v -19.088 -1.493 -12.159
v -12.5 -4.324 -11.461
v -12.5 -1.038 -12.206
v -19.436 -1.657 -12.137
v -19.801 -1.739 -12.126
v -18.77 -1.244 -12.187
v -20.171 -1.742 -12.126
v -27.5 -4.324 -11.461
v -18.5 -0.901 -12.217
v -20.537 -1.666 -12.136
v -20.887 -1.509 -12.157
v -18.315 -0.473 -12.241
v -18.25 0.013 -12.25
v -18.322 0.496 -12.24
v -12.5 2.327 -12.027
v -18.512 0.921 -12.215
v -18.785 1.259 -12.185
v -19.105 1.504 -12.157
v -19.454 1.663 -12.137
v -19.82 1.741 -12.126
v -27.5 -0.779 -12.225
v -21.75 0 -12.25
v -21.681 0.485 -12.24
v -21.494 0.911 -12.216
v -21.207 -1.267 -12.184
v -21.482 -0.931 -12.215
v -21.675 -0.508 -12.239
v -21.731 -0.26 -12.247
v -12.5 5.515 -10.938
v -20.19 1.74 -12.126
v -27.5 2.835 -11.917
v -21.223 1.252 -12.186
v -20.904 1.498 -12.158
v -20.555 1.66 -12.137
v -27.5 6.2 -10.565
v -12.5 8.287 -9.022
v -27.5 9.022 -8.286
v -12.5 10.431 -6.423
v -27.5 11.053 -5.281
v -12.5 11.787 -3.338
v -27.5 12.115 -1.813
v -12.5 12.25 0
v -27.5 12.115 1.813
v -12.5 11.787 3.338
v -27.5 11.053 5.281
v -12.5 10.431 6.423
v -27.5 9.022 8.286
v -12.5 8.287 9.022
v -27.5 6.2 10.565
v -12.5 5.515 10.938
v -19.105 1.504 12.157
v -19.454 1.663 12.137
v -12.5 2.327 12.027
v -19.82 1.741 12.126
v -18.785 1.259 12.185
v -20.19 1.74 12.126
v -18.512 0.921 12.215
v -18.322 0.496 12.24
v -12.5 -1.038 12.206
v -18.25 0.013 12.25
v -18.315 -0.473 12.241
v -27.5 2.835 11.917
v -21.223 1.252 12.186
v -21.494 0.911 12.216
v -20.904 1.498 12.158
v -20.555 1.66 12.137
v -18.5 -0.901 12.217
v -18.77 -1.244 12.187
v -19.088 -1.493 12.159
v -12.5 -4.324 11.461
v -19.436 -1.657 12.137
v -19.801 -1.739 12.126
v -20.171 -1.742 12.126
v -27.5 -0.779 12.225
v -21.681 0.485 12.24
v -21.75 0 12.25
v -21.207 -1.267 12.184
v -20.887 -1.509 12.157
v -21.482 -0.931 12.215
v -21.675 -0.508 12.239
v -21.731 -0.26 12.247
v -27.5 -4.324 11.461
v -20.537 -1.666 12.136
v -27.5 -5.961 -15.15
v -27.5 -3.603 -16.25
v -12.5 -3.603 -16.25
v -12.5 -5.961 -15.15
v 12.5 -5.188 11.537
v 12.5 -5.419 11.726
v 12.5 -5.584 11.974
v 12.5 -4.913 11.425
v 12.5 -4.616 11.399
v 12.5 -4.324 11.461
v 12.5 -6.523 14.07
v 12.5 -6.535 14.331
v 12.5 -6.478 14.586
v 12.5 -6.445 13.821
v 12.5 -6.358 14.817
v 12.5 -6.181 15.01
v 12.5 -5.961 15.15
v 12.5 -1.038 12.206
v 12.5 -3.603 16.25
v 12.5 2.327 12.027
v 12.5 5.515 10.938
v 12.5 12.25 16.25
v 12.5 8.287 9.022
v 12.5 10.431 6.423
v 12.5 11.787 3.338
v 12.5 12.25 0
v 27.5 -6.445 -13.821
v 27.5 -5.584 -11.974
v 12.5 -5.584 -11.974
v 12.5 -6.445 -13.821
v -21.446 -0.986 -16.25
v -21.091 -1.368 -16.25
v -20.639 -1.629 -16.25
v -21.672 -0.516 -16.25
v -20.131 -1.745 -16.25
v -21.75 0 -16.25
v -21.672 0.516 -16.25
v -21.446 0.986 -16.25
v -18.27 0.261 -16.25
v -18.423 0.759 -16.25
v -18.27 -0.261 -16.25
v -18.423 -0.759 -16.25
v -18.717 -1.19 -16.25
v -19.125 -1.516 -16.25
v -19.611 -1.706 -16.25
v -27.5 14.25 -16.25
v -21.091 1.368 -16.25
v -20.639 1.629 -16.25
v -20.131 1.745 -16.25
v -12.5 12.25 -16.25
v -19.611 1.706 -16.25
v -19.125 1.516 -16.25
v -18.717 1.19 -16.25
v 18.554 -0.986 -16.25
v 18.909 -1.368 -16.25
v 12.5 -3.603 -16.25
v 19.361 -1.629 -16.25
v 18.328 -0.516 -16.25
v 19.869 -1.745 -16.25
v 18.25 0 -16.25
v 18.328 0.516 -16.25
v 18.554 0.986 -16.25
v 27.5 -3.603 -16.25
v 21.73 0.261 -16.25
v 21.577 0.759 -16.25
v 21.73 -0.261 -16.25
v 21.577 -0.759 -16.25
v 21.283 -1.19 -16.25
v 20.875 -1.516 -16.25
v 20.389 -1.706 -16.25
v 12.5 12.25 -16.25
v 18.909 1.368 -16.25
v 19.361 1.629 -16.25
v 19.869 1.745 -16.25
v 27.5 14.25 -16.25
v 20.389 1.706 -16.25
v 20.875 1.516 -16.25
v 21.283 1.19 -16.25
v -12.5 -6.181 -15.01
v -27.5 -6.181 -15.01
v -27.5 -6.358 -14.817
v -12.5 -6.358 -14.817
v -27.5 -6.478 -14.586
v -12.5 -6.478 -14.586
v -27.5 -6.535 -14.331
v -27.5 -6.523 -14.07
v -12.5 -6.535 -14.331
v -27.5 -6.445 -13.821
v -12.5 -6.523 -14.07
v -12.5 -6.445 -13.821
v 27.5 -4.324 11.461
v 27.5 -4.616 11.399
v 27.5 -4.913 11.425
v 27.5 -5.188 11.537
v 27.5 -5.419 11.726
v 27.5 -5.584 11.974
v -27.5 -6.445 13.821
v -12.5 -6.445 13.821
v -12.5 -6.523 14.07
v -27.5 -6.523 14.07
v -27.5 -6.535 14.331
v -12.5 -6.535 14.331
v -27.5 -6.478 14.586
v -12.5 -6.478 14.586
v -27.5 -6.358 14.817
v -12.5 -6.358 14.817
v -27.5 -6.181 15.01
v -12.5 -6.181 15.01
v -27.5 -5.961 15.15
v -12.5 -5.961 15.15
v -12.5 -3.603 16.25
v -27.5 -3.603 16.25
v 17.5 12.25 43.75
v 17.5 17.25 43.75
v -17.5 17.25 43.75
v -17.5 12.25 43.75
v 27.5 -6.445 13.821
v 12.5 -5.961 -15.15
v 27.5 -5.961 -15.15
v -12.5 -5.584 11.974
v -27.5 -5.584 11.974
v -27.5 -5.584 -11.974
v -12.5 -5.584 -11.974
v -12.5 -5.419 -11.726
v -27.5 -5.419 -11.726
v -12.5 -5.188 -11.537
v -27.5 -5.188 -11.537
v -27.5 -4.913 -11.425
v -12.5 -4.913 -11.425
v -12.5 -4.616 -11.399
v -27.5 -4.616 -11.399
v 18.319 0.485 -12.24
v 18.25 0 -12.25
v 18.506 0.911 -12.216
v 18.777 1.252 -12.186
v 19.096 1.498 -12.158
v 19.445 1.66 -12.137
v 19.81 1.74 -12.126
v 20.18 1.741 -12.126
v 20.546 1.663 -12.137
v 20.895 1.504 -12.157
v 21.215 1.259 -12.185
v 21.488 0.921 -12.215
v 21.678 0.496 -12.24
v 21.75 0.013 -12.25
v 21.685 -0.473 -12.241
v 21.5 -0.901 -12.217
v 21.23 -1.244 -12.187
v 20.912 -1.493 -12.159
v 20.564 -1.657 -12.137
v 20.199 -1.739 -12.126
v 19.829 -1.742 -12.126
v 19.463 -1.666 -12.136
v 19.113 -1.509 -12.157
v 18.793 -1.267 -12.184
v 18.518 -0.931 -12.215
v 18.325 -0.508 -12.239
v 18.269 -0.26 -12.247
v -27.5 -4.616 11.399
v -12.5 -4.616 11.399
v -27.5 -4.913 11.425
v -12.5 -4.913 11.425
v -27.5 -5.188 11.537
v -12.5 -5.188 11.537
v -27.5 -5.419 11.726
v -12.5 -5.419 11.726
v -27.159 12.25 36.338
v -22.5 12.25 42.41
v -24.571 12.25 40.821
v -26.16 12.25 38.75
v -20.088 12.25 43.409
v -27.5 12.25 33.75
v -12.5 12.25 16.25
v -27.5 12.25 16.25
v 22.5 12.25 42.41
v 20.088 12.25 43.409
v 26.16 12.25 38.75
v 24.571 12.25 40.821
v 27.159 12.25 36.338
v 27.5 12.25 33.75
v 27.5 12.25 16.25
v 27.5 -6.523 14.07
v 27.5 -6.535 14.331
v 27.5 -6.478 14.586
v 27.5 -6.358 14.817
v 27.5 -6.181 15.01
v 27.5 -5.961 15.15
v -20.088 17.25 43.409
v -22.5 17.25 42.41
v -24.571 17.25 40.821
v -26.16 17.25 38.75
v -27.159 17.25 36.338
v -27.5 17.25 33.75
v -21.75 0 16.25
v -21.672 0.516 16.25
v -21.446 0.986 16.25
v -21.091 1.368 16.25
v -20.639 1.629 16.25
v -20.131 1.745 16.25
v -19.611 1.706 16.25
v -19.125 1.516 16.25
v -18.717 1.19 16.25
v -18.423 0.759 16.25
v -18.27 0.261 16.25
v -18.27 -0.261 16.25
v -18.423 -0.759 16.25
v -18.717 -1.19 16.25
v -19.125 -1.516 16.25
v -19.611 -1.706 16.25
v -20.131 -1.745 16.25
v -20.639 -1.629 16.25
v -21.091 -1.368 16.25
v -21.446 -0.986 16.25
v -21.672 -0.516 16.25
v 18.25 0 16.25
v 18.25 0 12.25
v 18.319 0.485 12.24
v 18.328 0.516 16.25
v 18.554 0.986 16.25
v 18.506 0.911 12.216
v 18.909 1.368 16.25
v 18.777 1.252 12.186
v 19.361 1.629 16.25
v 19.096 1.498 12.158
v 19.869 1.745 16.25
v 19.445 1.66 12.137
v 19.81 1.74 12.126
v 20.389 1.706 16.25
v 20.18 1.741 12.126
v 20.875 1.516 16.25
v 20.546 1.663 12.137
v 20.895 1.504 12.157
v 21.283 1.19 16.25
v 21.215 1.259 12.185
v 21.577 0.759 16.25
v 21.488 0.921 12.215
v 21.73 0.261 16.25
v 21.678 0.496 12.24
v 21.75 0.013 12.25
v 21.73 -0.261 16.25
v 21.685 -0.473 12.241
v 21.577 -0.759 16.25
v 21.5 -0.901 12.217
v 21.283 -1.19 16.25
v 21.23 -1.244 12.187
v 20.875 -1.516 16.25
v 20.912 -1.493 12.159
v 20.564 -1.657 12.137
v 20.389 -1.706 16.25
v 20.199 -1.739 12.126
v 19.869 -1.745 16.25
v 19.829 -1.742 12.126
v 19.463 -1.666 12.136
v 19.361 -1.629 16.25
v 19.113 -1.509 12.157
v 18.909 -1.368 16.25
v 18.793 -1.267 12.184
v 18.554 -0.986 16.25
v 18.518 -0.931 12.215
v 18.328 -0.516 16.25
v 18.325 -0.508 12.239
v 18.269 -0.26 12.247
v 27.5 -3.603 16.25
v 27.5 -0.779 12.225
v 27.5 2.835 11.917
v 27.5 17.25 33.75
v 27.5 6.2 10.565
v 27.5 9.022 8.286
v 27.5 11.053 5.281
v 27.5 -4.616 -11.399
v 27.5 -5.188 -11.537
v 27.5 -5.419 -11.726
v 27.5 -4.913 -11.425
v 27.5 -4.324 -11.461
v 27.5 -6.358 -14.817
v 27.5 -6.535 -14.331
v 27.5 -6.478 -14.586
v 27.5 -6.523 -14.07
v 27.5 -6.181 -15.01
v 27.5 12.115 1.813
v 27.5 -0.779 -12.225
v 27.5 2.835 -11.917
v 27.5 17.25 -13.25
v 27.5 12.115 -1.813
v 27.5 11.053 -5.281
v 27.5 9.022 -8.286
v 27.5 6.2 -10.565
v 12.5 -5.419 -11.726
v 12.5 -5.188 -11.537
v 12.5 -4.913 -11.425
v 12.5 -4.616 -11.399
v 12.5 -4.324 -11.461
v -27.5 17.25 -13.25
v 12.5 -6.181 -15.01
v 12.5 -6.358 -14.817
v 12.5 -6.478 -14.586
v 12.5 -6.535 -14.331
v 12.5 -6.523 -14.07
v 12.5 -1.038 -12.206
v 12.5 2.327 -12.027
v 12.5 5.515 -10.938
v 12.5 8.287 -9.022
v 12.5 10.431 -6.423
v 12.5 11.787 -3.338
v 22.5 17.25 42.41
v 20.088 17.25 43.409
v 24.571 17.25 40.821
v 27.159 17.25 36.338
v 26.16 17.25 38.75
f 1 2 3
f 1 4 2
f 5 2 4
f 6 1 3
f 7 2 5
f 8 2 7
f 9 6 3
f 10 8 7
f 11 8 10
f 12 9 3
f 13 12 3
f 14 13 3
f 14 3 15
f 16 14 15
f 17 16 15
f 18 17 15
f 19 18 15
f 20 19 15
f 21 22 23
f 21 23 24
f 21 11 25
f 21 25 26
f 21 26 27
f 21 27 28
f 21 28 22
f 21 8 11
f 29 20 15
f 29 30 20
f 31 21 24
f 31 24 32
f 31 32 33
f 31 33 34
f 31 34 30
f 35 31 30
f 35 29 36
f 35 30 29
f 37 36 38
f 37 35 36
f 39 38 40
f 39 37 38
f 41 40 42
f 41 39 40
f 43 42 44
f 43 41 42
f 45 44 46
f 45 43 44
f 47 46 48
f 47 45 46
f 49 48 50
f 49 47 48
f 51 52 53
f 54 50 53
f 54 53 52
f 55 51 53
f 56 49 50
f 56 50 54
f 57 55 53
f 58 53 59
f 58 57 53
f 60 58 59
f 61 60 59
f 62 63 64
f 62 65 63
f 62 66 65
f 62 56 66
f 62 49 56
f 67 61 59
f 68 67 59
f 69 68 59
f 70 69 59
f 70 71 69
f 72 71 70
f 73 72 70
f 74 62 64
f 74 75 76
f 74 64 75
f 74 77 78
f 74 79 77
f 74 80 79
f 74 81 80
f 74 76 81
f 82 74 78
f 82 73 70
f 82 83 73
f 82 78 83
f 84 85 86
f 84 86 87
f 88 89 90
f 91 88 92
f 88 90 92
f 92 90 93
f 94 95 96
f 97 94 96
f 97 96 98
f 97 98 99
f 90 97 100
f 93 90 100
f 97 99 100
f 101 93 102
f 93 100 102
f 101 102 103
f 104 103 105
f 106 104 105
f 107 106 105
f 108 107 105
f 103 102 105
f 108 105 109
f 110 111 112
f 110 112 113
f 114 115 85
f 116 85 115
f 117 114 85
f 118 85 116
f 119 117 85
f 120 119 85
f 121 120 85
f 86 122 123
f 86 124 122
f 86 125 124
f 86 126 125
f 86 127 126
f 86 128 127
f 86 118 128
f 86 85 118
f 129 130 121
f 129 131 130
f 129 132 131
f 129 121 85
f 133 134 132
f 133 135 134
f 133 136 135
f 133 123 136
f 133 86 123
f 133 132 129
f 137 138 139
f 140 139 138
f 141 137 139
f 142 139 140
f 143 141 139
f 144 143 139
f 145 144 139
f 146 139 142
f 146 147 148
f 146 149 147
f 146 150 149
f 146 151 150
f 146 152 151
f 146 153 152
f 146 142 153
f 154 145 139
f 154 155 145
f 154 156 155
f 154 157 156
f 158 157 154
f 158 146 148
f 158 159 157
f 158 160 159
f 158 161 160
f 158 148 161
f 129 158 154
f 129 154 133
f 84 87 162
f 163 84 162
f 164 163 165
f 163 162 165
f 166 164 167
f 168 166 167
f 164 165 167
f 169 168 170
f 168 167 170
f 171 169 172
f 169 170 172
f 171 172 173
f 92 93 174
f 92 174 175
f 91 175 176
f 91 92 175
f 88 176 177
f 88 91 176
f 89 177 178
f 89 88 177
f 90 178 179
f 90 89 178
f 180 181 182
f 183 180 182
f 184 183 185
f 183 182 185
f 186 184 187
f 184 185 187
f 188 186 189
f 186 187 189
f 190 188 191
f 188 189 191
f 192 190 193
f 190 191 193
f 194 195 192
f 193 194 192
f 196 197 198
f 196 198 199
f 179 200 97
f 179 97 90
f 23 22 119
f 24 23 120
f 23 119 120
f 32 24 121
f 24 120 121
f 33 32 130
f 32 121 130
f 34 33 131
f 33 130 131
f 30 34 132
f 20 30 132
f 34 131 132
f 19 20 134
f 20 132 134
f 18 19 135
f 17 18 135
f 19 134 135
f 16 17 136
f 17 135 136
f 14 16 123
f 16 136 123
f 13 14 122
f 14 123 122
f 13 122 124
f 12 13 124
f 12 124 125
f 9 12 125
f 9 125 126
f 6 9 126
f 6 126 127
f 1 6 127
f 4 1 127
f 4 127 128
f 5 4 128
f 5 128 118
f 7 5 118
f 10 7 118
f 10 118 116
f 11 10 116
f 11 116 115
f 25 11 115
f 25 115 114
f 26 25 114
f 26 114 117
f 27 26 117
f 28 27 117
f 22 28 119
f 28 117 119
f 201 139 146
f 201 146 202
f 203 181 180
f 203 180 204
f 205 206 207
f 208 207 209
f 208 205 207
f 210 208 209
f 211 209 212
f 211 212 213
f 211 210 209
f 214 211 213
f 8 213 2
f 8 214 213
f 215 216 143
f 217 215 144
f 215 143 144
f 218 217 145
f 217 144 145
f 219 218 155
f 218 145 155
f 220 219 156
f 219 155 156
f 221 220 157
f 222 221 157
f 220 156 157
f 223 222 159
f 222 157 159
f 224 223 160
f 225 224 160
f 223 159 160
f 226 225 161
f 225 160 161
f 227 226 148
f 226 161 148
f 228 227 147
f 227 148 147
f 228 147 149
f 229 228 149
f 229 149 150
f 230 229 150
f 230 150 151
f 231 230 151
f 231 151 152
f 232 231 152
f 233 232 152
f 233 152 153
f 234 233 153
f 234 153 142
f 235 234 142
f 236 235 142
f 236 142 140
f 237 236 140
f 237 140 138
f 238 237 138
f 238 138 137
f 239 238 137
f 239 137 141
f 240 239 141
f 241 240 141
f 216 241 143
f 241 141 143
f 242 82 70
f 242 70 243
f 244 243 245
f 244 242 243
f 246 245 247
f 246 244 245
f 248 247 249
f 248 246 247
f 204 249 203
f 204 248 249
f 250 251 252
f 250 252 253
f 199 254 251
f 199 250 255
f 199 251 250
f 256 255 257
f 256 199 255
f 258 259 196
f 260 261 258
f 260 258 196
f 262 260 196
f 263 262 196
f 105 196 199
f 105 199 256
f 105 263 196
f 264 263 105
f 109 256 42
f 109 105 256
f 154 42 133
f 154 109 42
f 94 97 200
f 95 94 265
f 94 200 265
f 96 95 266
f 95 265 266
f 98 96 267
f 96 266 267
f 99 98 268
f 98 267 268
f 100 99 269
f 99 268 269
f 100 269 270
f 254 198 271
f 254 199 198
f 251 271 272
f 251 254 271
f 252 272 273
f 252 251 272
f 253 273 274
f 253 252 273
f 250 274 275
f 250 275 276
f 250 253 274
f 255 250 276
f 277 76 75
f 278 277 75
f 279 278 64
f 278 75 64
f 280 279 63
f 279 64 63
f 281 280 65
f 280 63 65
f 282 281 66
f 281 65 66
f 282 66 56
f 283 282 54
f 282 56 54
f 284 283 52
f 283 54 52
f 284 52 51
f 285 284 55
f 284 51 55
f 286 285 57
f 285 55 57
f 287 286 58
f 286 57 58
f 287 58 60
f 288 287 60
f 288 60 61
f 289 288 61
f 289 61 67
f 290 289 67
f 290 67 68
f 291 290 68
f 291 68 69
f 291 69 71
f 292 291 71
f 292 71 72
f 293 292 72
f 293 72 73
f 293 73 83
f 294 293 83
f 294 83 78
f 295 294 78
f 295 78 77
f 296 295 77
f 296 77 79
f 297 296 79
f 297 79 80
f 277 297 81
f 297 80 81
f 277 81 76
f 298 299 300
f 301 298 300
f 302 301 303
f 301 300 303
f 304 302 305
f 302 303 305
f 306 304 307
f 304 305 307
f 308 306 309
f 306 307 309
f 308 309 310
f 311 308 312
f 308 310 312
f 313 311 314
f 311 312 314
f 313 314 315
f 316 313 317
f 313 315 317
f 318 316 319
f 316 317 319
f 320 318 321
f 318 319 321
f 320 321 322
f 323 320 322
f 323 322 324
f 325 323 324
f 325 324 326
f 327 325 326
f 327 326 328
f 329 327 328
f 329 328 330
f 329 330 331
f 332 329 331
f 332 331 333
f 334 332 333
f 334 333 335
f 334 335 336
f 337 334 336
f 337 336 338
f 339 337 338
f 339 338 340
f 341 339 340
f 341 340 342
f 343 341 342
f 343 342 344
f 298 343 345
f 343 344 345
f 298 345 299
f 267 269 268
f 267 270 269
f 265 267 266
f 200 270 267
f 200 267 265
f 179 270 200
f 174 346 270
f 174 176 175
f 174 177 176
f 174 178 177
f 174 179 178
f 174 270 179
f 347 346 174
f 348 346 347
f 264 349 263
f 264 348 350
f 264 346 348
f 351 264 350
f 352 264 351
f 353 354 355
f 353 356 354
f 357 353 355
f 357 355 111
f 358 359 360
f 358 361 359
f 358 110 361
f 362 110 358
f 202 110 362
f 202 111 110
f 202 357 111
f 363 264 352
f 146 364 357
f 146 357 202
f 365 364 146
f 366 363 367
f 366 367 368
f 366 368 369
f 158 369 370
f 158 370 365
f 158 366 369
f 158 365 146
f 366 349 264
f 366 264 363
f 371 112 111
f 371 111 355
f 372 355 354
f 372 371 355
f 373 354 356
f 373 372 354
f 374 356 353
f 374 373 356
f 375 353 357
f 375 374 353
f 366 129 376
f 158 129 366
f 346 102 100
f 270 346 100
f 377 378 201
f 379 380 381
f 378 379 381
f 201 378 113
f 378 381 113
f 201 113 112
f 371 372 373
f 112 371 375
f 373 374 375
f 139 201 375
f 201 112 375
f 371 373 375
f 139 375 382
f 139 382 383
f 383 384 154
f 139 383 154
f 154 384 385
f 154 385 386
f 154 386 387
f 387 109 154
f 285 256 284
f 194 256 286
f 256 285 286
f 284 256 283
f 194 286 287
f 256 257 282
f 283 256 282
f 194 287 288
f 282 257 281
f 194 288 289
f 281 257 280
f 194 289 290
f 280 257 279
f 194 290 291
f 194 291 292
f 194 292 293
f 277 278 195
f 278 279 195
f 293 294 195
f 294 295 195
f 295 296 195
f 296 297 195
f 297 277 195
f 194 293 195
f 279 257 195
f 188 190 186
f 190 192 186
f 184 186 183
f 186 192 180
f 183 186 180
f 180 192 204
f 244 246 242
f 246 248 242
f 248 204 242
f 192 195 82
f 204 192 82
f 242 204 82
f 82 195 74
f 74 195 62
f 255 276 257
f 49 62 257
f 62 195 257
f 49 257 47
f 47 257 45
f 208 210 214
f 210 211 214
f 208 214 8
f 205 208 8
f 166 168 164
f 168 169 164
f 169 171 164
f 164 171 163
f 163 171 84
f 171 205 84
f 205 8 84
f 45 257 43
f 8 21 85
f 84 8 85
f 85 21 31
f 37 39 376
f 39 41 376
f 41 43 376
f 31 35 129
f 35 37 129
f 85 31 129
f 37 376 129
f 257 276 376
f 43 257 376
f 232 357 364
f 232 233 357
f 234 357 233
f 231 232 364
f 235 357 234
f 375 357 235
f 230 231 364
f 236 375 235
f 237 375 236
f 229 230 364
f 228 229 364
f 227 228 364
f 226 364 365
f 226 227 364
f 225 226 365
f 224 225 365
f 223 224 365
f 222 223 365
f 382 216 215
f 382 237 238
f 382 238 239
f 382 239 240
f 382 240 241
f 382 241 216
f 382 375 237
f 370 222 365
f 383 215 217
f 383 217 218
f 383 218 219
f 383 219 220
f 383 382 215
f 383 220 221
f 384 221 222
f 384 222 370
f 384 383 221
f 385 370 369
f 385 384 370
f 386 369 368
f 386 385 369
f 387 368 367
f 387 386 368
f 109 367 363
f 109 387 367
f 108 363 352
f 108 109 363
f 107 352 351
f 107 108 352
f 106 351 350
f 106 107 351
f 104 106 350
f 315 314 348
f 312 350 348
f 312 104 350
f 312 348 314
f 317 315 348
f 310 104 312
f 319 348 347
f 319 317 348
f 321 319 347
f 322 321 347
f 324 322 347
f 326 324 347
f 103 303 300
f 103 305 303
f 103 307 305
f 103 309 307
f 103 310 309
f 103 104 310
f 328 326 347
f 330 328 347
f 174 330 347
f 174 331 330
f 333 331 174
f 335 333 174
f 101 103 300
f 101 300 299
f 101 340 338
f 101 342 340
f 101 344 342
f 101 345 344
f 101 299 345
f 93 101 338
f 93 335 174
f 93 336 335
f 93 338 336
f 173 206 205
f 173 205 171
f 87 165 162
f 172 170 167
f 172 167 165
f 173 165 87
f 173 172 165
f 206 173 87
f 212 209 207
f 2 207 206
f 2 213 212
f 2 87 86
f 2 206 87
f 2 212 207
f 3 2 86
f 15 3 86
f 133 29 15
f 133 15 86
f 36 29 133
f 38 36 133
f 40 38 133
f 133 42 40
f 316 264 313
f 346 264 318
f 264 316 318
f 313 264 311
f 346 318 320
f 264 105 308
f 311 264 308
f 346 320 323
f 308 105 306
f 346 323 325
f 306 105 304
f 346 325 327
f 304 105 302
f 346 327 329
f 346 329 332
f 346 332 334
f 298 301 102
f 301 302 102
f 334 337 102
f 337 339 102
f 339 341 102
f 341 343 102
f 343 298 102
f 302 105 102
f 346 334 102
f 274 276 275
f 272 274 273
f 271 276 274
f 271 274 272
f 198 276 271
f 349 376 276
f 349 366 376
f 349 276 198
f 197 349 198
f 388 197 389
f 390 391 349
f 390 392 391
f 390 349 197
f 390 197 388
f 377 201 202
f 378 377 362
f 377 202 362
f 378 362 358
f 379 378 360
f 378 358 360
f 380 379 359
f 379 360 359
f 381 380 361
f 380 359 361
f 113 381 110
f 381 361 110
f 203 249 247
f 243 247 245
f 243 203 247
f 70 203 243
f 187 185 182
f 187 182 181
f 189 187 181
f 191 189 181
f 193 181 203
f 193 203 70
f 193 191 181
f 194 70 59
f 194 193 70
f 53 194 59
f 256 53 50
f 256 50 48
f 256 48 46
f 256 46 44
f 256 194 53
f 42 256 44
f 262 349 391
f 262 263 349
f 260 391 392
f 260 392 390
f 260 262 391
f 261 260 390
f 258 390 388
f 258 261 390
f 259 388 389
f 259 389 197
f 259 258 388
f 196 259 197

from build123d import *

# Parameters (mm, degrees)
SKETCH_1_R               = 12.25
EXTRUDE_1_DEPTH          = 27.5
CUT_EXTRUDE_2_DEPTH      = 1
CUT_EXTRUDE_2_DEPTH_BACK = 56
EXTRUDE_2_DEPTH          = 55
FILLET_1_R               = 1
SKETCH_5_R               = 1.75
CUT_EXTRUDE_3_DEPTH      = 61
SKETCH_2_W               = 25
SKETCH_2_H               = 30
CUT_EXTRUDE_1_DEPTH      = 33.5000001
FILLET_2_R               = 10
CHAMFER_1_SIZE           = 3


with BuildPart() as part:
    # ｽｹｯﾁ1 → ﾎﾞｽ - 押し出し1 (new body, symmetric)
    with BuildSketch(Plane(origin=(0, 0, 0), x_dir=(0, 0, -1), z_dir=(1, 0, 0))):
        with BuildLine():
            Line((16.25, 0), (16.25, 17.25))
            Line((16.25, 17.25), (-43.75, 17.25))
            Line((-43.75, 17.25), (-43.75, 12.25))
            Line((-43.75, 12.25), (-16.25, 12.25))
            Line((-16.25, 12.25), (-16.25, 0))
            ThreePointArc((-16.25, 0), (0, -16.25), (16.25, 0))
        make_face()
        Circle(SKETCH_1_R, mode=Mode.SUBTRACT)
    extrude(amount=EXTRUDE_1_DEPTH, both=True)

    # ｽｹｯﾁ3 → ｶｯﾄ - 押し出し2 (cut, two sides)
    with BuildSketch(Plane(origin=(27.5, 0, 0), x_dir=(0, 0, -1), z_dir=(1, 0, 0))) as cut_extrude_2_sk:
        Polygon((-152.616304173, -71.166151395), (-17.557784777, -8.187329502), (0, 0), (20.401420048, -9.513338406), (155.459939444, -72.492160299), (154.177134941, -370.530575754), (-153.899108676, -369.20456685), align=None)
    extrude(amount=CUT_EXTRUDE_2_DEPTH, mode=Mode.SUBTRACT)
    extrude(cut_extrude_2_sk.sketch, amount=-CUT_EXTRUDE_2_DEPTH_BACK, mode=Mode.SUBTRACT)

    # ｽｹｯﾁ4 → ﾎﾞｽ - 押し出し2 (add)
    with BuildSketch(Plane.ZY.offset(27.5)):
        with BuildLine():
            Line((16.25, 0), (16.25, -3.602538268))
            Line((16.25, -3.602538268), (14.727501539, -6.867546753))
            ThreePointArc((14.727501539, -6.867546753), (15.864810116, -3.517143726), (16.25, 0))
        make_face()
        with BuildLine():
            Line((-16.25, 0), (-16.25, -3.602538268))
            Line((-16.25, -3.602538268), (-14.727501539, -6.867546753))
            ThreePointArc((-14.727501539, -6.867546753), (-15.864810116, -3.517143726), (-16.25, 0))
        make_face()
    extrude(amount=-EXTRUDE_2_DEPTH)

    # ﾌｨﾚｯﾄ1
    fillet_1_edges = [part.edges().sort_by_distance(p)[0] for p in [
        (0, -5.177073706, -11.102270391),
        (0, -5.177073706, 11.102270391),
        (0, -6.867546753, 14.727501539),
        (0, -6.867546753, -14.727501539),
    ]]
    fillet(fillet_1_edges, radius=FILLET_1_R)

    # ｽｹｯﾁ5 → ｶｯﾄ - 押し出し3 (cut, through all)
    with BuildSketch(Plane(origin=(0, 0, -16.25), x_dir=(-1, 0, 0), z_dir=(0, 0, -1))):
        with Locations((20, 0)):
            Circle(SKETCH_5_R)
        with Locations((-20, 0)):
            Circle(SKETCH_5_R)
    extrude(amount=-CUT_EXTRUDE_3_DEPTH, mode=Mode.SUBTRACT)

    # ｽｹｯﾁ2 → ｶｯﾄ - 押し出し1 (cut, through all)
    with BuildSketch(Plane.XY.offset(16.25)):
        with Locations((0, -2.75)):
            Rectangle(SKETCH_2_W, SKETCH_2_H)
    extrude(amount=-CUT_EXTRUDE_1_DEPTH, mode=Mode.SUBTRACT)

    # ﾌｨﾚｯﾄ2
    fillet_2_edges = [part.edges().sort_by_distance(p)[0] for p in [
        (27.5, 14.75, 43.75),
        (-27.5, 14.75, 43.75),
    ]]
    fillet(fillet_2_edges, radius=FILLET_2_R)

    # 面取り1
    chamfer_1_edges = [part.edges().sort_by_distance(p)[0] for p in [
        (0, 17.25, -16.25),
    ]]
    chamfer(chamfer_1_edges, length=CHAMFER_1_SIZE)


solid = part.part
